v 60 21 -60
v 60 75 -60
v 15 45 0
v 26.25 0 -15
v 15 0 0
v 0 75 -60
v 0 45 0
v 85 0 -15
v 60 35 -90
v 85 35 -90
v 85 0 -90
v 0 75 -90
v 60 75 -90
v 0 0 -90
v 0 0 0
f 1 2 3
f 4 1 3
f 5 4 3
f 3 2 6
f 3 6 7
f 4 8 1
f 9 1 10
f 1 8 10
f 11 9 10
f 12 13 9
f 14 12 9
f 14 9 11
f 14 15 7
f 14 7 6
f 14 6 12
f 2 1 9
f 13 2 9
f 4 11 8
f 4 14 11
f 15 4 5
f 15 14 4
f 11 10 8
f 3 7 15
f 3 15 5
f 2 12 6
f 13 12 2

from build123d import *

# Parameters (mm, degrees)
SKETCH1_W           = 60
SKETCH1_H           = 90
EXTRUDE1_DEPTH      = 75
EXTRUDE2_DEPTH      = 61
EXTRUDE3_DEPTH      = 76
EXTRUDE4_DEPTH      = 25
EXTRUDE4_DEPTH_BACK = 55


with BuildPart() as part:
    # Sketch1 → Extrude1 (new body)
    with BuildSketch(Plane(origin=(0, 0, 0), x_dir=(1, 0, 0), z_dir=(0, 1, 0))):
        with Locations((30, 45)):
            Rectangle(SKETCH1_W, SKETCH1_H)
    extrude(amount=EXTRUDE1_DEPTH)

    # Sketch2 → Extrude2 (cut, through all)
    with BuildSketch(Plane(origin=(60, 0, 0), x_dir=(0, 0, -1), z_dir=(1, 0, 0))):
        Polygon((60, 75), (0, 45), (0, 75), align=None)
    extrude(amount=-EXTRUDE2_DEPTH, mode=Mode.SUBTRACT)

    # Sketch3 → Extrude3 (cut, through all)
    with BuildSketch(Plane(origin=(0, 75, 0), x_dir=(1, 0, 0), z_dir=(0, 1, 0))):
        Polygon((60, 60), (15, 0), (60, 0), align=None)
    extrude(amount=-EXTRUDE3_DEPTH, mode=Mode.SUBTRACT)

    # Sketch4 → Extrude4 (add, two sides)
    with BuildSketch(Plane(origin=(60, 0, 0), x_dir=(0, 0, -1), z_dir=(1, 0, 0))) as extrude4_sk:
        Polygon((90, 0), (15, 0), (90, 35), align=None)
    extrude(amount=EXTRUDE4_DEPTH)
    extrude(extrude4_sk.sketch, amount=-EXTRUDE4_DEPTH_BACK)


solid = part.part
